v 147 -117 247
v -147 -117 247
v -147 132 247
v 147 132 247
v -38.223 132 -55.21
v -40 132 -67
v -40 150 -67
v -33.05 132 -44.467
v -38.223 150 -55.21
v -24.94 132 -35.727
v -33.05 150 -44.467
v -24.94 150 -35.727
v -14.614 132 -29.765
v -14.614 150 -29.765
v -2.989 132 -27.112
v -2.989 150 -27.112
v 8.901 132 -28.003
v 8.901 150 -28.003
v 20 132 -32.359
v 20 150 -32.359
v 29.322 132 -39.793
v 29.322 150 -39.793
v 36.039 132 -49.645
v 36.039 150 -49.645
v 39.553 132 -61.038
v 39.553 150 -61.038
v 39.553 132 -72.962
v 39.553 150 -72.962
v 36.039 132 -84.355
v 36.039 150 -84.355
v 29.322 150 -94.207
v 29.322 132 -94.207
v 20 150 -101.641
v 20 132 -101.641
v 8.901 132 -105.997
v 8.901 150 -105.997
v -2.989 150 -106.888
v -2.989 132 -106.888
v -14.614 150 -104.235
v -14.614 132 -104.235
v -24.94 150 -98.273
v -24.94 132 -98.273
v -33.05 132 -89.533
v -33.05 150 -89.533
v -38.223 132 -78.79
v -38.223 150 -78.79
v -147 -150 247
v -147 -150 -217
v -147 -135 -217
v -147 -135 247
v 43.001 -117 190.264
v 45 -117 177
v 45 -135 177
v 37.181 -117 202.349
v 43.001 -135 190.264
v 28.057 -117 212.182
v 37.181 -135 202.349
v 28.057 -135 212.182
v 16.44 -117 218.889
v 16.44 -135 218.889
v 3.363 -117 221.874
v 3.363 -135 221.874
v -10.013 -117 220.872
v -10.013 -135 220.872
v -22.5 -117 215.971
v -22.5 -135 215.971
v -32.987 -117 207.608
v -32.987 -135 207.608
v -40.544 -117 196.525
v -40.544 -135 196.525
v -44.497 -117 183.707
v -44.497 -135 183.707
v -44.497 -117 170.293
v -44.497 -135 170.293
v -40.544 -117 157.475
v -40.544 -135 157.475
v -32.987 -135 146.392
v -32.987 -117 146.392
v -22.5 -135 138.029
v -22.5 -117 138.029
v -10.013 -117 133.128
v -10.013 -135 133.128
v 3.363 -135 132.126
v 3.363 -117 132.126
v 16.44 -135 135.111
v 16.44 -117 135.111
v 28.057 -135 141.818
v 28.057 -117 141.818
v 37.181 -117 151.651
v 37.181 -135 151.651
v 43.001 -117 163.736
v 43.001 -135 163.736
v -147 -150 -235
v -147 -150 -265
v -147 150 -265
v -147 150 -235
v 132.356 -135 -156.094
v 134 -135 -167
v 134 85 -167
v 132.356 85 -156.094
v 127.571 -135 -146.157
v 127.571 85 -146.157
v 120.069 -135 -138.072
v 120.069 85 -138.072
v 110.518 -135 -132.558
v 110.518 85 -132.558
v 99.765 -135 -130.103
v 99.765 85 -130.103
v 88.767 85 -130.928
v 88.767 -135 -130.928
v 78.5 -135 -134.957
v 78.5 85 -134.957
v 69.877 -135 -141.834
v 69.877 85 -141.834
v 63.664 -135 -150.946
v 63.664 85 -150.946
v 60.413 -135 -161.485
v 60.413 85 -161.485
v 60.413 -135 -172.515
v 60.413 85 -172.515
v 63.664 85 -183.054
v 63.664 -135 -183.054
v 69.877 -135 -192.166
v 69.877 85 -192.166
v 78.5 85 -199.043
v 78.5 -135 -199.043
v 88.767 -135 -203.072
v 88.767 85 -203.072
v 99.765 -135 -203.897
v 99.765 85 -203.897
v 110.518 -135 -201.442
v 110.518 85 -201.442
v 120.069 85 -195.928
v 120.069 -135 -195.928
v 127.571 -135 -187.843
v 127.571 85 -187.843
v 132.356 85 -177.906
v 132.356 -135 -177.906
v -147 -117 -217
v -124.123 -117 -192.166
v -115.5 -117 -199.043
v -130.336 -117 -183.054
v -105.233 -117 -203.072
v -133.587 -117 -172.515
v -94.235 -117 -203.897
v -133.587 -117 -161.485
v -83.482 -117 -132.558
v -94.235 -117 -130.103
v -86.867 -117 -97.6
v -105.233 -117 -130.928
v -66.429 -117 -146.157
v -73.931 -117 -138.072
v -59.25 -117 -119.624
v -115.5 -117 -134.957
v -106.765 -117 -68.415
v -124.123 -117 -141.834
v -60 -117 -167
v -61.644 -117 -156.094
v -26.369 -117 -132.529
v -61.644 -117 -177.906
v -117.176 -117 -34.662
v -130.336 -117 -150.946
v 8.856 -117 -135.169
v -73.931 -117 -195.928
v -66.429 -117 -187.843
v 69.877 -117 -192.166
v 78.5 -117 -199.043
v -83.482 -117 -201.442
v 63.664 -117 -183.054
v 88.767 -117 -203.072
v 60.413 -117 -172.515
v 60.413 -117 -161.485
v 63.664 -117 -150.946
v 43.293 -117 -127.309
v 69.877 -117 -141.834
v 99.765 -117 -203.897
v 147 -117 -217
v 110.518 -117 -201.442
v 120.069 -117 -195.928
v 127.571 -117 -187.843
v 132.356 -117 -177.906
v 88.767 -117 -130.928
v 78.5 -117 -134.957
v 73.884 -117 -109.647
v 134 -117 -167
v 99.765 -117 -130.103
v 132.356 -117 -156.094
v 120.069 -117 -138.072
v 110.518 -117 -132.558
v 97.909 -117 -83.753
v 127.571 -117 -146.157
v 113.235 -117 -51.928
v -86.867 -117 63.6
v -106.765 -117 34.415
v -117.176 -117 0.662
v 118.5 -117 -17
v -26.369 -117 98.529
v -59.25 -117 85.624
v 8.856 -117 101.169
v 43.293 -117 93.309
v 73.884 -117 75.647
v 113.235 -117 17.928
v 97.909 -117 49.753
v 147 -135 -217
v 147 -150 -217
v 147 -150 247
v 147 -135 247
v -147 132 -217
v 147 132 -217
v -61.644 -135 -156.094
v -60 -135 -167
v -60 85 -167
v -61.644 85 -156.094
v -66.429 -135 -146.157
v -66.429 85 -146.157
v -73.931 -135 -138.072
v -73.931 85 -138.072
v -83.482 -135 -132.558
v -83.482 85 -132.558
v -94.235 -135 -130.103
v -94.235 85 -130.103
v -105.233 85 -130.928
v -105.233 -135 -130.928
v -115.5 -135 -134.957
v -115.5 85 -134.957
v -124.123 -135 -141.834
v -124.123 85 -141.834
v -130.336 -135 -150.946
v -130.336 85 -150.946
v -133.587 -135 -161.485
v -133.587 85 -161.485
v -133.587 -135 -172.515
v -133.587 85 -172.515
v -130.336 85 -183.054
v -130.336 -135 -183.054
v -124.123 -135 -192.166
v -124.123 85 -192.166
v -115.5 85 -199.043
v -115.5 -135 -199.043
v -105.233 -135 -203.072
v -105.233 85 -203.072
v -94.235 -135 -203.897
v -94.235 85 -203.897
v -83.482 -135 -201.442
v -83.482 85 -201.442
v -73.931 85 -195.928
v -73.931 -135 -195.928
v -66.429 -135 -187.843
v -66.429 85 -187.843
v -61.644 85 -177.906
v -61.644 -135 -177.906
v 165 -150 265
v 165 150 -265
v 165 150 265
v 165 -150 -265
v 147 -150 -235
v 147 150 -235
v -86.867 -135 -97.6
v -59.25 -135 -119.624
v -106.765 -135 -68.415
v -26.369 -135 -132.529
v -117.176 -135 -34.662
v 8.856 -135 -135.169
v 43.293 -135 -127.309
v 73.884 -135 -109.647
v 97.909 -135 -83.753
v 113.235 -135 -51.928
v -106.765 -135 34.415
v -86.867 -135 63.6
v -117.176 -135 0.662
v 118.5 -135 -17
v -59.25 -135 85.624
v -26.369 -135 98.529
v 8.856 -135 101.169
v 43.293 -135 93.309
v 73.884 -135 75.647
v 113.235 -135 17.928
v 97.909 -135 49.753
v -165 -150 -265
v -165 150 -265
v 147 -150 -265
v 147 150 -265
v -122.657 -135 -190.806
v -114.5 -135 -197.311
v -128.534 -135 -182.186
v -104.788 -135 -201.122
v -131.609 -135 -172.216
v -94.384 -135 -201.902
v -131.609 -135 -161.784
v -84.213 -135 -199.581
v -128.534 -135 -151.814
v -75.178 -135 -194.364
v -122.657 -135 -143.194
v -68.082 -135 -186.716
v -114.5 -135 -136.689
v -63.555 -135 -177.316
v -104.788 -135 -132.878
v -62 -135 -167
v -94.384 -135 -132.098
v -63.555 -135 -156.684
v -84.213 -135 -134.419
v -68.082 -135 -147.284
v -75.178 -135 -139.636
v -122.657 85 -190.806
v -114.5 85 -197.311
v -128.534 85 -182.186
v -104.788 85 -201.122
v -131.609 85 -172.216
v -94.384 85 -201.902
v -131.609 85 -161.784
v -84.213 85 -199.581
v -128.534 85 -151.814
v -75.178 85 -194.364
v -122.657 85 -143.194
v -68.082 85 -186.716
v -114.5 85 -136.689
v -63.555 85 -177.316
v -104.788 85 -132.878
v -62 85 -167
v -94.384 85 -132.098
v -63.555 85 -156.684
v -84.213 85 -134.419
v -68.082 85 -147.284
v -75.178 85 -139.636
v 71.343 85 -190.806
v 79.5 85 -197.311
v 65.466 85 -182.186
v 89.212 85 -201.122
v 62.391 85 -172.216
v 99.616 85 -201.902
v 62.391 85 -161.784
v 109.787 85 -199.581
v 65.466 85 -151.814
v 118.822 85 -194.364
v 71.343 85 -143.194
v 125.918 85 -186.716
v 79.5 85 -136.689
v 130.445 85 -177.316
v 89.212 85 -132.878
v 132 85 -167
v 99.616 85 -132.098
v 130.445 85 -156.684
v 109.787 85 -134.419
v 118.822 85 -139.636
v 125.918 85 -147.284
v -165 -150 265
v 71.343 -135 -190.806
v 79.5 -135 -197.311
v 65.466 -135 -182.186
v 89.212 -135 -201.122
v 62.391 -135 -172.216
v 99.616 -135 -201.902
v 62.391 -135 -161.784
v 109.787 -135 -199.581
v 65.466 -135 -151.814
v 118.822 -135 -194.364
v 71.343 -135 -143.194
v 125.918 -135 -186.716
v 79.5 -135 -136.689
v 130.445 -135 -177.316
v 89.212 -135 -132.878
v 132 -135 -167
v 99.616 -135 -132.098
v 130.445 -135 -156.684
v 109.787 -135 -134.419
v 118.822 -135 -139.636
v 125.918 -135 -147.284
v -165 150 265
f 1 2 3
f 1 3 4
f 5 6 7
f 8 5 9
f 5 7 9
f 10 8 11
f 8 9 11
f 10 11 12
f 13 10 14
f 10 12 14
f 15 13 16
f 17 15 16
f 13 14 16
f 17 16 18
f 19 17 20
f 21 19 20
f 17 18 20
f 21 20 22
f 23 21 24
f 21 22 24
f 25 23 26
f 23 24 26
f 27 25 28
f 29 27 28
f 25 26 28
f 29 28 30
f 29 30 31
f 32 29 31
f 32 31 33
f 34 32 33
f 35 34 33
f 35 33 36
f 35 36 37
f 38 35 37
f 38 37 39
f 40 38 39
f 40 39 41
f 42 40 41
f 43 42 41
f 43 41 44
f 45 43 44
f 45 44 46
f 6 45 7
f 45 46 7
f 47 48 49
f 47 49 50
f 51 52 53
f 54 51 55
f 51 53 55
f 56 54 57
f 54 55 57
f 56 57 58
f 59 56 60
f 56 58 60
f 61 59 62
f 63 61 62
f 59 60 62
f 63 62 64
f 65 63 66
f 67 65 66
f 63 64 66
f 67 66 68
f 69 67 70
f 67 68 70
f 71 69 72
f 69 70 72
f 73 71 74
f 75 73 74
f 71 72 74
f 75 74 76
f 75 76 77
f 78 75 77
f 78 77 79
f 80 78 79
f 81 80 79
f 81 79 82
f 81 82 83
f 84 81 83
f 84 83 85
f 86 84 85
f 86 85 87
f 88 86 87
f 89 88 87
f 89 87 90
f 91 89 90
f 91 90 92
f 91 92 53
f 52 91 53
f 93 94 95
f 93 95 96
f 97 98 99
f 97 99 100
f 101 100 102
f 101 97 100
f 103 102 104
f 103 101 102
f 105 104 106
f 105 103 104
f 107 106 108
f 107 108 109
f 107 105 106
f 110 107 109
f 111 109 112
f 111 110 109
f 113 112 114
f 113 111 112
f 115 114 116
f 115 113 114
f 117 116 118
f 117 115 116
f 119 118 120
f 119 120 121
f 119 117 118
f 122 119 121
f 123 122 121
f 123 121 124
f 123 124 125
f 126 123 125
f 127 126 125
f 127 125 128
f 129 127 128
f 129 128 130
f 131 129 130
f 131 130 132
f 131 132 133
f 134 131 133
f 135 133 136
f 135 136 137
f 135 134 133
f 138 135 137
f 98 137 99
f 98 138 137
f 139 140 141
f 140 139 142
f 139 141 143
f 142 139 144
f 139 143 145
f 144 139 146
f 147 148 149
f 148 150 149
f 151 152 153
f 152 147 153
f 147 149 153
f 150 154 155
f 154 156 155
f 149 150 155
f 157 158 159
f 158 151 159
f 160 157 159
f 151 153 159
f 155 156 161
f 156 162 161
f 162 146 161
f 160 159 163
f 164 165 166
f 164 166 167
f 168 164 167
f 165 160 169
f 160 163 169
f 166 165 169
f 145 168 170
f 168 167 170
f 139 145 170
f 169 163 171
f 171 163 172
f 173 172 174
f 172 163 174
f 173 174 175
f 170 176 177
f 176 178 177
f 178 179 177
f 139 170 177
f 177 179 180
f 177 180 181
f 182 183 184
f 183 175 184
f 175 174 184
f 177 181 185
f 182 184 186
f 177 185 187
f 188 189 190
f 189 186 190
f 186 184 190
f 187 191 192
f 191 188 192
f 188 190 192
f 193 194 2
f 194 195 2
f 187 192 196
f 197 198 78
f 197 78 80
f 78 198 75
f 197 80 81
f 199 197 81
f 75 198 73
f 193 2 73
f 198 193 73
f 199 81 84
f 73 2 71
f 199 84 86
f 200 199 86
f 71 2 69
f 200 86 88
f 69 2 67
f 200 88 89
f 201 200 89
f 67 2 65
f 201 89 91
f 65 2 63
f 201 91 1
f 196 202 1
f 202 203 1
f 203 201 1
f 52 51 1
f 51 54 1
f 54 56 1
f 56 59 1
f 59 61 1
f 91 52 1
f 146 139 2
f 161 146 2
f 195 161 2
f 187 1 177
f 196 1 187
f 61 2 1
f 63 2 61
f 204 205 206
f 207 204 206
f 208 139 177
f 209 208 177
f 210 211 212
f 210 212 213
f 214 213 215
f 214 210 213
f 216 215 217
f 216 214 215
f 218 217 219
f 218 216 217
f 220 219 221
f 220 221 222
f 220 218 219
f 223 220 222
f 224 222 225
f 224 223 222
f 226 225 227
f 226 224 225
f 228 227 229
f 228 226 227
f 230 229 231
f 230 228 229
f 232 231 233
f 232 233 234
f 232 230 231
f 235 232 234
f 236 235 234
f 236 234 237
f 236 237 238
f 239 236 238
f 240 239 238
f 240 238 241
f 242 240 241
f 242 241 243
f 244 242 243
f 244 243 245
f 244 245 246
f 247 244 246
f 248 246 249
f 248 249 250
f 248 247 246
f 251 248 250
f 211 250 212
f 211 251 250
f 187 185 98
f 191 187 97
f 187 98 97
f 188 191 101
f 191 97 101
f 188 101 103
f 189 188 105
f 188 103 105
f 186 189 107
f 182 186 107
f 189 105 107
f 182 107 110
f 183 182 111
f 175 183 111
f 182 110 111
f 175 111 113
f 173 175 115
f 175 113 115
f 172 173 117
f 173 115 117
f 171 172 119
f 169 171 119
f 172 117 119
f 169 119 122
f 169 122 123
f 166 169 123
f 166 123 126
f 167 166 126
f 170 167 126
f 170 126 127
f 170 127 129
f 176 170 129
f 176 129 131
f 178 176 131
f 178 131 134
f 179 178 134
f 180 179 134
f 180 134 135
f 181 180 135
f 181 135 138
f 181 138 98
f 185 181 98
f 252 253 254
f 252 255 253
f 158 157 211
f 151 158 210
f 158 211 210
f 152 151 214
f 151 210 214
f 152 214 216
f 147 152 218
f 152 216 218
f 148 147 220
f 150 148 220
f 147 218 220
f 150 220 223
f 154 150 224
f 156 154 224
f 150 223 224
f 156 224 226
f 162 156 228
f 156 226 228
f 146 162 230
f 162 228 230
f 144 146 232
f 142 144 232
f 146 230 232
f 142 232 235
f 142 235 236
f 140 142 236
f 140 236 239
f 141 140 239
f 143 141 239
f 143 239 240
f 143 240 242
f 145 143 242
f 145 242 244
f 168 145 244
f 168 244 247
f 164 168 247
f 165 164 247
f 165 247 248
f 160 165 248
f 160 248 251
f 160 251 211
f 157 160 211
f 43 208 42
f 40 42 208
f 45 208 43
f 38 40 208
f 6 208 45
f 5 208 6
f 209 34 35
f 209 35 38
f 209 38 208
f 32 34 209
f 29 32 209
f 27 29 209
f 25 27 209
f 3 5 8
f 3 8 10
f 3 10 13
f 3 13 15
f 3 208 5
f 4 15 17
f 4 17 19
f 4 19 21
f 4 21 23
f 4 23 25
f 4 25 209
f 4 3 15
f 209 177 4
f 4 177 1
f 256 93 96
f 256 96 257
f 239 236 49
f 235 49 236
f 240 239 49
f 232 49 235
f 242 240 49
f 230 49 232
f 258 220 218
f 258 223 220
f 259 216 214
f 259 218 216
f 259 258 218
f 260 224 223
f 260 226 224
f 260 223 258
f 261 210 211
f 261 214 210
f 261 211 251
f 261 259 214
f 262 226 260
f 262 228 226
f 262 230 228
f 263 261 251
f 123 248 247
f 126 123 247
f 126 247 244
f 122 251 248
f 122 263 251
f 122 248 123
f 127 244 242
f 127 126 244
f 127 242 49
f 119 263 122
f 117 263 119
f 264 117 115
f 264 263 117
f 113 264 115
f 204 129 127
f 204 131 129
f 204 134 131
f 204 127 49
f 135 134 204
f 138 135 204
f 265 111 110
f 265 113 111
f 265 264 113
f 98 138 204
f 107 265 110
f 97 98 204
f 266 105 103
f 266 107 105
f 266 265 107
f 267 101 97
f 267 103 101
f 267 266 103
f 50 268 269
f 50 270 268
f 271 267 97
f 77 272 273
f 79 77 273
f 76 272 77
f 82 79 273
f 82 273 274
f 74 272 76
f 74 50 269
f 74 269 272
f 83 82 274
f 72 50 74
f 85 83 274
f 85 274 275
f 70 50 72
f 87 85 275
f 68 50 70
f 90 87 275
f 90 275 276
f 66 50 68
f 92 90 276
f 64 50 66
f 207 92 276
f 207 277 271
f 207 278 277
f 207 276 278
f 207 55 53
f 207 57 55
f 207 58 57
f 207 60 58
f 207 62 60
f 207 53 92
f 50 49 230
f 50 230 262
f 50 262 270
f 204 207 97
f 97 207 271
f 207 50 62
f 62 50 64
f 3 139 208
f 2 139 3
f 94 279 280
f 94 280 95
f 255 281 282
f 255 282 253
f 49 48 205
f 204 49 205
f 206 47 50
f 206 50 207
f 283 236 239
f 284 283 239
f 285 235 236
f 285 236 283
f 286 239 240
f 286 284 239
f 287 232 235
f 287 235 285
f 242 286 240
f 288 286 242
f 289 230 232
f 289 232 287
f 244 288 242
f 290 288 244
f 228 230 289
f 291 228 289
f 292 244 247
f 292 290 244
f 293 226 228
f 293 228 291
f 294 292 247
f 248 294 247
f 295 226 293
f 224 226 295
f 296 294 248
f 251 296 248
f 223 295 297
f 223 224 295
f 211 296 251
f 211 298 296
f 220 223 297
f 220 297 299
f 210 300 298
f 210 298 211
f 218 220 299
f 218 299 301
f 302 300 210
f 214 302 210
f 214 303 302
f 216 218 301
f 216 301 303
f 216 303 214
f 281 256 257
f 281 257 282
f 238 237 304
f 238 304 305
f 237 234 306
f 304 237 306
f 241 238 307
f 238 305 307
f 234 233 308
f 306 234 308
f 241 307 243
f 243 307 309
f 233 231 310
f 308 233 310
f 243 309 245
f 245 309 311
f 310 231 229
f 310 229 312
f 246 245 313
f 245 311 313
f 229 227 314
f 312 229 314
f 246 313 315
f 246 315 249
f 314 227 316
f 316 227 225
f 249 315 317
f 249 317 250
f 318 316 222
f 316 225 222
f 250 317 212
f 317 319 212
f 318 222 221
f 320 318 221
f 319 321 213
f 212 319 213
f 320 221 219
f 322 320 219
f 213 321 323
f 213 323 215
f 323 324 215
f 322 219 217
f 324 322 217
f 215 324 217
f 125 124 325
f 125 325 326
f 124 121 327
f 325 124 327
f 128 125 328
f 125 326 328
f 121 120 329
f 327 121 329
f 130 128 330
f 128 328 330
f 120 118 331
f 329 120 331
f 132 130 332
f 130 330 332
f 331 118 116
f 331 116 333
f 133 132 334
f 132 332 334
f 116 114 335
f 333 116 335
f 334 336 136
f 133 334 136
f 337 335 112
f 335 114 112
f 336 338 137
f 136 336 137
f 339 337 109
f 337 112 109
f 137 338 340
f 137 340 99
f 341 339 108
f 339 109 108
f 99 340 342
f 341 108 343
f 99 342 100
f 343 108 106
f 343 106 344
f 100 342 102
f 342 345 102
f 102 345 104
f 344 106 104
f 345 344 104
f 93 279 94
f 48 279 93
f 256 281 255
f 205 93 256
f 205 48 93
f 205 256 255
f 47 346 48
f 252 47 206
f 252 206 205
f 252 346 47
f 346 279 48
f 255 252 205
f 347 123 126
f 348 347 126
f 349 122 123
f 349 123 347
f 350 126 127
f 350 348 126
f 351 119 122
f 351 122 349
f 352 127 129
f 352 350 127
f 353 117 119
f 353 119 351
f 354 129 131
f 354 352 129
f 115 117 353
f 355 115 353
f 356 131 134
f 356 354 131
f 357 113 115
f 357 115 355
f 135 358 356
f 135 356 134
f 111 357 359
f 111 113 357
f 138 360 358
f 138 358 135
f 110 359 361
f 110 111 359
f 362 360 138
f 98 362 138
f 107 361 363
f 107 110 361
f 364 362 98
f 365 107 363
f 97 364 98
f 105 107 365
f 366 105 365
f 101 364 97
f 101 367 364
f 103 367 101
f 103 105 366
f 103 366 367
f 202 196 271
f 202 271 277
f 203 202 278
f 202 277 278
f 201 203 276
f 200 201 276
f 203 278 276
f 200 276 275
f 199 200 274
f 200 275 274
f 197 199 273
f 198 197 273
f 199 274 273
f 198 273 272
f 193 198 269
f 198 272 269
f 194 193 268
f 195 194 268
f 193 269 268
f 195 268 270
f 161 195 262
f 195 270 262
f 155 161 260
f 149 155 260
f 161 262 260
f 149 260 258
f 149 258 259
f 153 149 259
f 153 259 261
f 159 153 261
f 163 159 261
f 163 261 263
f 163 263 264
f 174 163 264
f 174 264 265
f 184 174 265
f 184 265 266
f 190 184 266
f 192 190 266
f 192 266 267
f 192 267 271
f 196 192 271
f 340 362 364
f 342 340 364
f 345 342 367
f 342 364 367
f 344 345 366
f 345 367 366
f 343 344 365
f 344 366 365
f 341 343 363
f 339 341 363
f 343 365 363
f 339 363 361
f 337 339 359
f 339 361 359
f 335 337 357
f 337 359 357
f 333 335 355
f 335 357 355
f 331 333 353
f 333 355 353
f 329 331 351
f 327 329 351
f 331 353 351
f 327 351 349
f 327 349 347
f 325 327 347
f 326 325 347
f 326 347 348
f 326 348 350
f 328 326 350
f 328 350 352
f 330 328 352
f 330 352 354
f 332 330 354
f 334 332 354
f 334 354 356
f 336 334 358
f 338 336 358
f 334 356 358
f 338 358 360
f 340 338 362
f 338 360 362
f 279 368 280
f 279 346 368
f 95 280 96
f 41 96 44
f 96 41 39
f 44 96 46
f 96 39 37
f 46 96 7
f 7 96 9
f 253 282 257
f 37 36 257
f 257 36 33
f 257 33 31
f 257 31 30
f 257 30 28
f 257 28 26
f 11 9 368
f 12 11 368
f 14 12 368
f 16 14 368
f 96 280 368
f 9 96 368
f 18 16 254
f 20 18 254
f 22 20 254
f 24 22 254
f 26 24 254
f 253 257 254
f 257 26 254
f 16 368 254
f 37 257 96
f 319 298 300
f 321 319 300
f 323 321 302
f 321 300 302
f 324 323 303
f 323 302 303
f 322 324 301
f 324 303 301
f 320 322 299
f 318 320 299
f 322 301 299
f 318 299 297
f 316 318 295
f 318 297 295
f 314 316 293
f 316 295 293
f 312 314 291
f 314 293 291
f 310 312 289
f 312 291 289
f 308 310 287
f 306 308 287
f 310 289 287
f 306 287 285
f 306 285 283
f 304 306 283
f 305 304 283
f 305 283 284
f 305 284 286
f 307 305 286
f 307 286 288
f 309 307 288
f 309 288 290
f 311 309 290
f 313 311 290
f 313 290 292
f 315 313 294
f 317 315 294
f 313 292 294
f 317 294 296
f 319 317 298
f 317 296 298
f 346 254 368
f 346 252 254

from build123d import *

# Parameters (mm, degrees)
F1_DEPTH  = 150
F2_W      = 294
F2_H      = 464
F3_DEPTH  = 282
F4_W      = 294
F4_H      = 464
F4_R      = 37
F4_R_2    = 118.5
F4_R_3    = 45
F5_DEPTH  = 33
F6_DEPTH  = 15
F7_R      = 40
F8_DEPTH  = 18
F9_R      = 37
F9_R_2    = 35
F10_DEPTH = 220


with BuildPart() as f1:
    # F0 (on Front) → F1 (new body, symmetric)
    with BuildSketch(Plane.XZ):
        Polygon((-165, 265), (-165, -265), (-147, -265), (-147, -235), (147, -235), (147, -265), (165, -265), (165, 265), align=None)
    extrude(amount=F1_DEPTH, both=True)

    # F2 (on face) → F3 (cut)
    with BuildSketch(Plane.XZ.offset(150)):
        with Locations((0, 15)):
            Rectangle(F2_W, F2_H)
    extrude(amount=-F3_DEPTH, mode=Mode.SUBTRACT)

    # F4 (on face) → F5 (join)
    with BuildSketch(Plane.XZ.offset(150)):
        with Locations((0, 15)):
            Rectangle(F4_W, F4_H)
        with Locations((-97, -167)):
            Circle(F4_R, mode=Mode.SUBTRACT)
        with Locations((97, -167)):
            Circle(F4_R, mode=Mode.SUBTRACT)
        with Locations((0, -17)):
            Circle(F4_R_2, mode=Mode.SUBTRACT)
        with Locations((0, 177)):
            Circle(F4_R_3, mode=Mode.SUBTRACT)
    extrude(amount=-F5_DEPTH)

    # F4 (on face) → F6 (cut)
    with BuildSketch(Plane.XZ.offset(150)):
        with Locations((0, 15)):
            Rectangle(F4_W, F4_H)
        with Locations((-97, -167)):
            Circle(F4_R, mode=Mode.SUBTRACT)
        with Locations((97, -167)):
            Circle(F4_R, mode=Mode.SUBTRACT)
        with Locations((0, -17)):
            Circle(F4_R_2, mode=Mode.SUBTRACT)
        with Locations((0, 177)):
            Circle(F4_R_3, mode=Mode.SUBTRACT)
    extrude(amount=-F6_DEPTH, mode=Mode.SUBTRACT)

    # F7 (on face) → F8 (cut, through all)
    with BuildSketch(Plane(origin=(0, 150, 0), x_dir=(-1, 0, 0), z_dir=(0, 1, 0))):
        with Locations((0, -67)):
            Circle(F7_R)
    extrude(amount=-F8_DEPTH, mode=Mode.SUBTRACT)


with BuildPart() as f10:
    # F9 (on face) → F10 (new body)
    with BuildSketch(Plane.XZ.offset(135)):
        with Locations((-97, -167)):
            Circle(F9_R)
        with Locations((-97, -167)):
            Circle(F9_R_2, mode=Mode.SUBTRACT)
        with Locations((97, -167)):
            Circle(F9_R)
        with Locations((97, -167)):
            Circle(F9_R_2, mode=Mode.SUBTRACT)
    extrude(amount=-F10_DEPTH)


solid = Compound([f1.part, f10.part])
